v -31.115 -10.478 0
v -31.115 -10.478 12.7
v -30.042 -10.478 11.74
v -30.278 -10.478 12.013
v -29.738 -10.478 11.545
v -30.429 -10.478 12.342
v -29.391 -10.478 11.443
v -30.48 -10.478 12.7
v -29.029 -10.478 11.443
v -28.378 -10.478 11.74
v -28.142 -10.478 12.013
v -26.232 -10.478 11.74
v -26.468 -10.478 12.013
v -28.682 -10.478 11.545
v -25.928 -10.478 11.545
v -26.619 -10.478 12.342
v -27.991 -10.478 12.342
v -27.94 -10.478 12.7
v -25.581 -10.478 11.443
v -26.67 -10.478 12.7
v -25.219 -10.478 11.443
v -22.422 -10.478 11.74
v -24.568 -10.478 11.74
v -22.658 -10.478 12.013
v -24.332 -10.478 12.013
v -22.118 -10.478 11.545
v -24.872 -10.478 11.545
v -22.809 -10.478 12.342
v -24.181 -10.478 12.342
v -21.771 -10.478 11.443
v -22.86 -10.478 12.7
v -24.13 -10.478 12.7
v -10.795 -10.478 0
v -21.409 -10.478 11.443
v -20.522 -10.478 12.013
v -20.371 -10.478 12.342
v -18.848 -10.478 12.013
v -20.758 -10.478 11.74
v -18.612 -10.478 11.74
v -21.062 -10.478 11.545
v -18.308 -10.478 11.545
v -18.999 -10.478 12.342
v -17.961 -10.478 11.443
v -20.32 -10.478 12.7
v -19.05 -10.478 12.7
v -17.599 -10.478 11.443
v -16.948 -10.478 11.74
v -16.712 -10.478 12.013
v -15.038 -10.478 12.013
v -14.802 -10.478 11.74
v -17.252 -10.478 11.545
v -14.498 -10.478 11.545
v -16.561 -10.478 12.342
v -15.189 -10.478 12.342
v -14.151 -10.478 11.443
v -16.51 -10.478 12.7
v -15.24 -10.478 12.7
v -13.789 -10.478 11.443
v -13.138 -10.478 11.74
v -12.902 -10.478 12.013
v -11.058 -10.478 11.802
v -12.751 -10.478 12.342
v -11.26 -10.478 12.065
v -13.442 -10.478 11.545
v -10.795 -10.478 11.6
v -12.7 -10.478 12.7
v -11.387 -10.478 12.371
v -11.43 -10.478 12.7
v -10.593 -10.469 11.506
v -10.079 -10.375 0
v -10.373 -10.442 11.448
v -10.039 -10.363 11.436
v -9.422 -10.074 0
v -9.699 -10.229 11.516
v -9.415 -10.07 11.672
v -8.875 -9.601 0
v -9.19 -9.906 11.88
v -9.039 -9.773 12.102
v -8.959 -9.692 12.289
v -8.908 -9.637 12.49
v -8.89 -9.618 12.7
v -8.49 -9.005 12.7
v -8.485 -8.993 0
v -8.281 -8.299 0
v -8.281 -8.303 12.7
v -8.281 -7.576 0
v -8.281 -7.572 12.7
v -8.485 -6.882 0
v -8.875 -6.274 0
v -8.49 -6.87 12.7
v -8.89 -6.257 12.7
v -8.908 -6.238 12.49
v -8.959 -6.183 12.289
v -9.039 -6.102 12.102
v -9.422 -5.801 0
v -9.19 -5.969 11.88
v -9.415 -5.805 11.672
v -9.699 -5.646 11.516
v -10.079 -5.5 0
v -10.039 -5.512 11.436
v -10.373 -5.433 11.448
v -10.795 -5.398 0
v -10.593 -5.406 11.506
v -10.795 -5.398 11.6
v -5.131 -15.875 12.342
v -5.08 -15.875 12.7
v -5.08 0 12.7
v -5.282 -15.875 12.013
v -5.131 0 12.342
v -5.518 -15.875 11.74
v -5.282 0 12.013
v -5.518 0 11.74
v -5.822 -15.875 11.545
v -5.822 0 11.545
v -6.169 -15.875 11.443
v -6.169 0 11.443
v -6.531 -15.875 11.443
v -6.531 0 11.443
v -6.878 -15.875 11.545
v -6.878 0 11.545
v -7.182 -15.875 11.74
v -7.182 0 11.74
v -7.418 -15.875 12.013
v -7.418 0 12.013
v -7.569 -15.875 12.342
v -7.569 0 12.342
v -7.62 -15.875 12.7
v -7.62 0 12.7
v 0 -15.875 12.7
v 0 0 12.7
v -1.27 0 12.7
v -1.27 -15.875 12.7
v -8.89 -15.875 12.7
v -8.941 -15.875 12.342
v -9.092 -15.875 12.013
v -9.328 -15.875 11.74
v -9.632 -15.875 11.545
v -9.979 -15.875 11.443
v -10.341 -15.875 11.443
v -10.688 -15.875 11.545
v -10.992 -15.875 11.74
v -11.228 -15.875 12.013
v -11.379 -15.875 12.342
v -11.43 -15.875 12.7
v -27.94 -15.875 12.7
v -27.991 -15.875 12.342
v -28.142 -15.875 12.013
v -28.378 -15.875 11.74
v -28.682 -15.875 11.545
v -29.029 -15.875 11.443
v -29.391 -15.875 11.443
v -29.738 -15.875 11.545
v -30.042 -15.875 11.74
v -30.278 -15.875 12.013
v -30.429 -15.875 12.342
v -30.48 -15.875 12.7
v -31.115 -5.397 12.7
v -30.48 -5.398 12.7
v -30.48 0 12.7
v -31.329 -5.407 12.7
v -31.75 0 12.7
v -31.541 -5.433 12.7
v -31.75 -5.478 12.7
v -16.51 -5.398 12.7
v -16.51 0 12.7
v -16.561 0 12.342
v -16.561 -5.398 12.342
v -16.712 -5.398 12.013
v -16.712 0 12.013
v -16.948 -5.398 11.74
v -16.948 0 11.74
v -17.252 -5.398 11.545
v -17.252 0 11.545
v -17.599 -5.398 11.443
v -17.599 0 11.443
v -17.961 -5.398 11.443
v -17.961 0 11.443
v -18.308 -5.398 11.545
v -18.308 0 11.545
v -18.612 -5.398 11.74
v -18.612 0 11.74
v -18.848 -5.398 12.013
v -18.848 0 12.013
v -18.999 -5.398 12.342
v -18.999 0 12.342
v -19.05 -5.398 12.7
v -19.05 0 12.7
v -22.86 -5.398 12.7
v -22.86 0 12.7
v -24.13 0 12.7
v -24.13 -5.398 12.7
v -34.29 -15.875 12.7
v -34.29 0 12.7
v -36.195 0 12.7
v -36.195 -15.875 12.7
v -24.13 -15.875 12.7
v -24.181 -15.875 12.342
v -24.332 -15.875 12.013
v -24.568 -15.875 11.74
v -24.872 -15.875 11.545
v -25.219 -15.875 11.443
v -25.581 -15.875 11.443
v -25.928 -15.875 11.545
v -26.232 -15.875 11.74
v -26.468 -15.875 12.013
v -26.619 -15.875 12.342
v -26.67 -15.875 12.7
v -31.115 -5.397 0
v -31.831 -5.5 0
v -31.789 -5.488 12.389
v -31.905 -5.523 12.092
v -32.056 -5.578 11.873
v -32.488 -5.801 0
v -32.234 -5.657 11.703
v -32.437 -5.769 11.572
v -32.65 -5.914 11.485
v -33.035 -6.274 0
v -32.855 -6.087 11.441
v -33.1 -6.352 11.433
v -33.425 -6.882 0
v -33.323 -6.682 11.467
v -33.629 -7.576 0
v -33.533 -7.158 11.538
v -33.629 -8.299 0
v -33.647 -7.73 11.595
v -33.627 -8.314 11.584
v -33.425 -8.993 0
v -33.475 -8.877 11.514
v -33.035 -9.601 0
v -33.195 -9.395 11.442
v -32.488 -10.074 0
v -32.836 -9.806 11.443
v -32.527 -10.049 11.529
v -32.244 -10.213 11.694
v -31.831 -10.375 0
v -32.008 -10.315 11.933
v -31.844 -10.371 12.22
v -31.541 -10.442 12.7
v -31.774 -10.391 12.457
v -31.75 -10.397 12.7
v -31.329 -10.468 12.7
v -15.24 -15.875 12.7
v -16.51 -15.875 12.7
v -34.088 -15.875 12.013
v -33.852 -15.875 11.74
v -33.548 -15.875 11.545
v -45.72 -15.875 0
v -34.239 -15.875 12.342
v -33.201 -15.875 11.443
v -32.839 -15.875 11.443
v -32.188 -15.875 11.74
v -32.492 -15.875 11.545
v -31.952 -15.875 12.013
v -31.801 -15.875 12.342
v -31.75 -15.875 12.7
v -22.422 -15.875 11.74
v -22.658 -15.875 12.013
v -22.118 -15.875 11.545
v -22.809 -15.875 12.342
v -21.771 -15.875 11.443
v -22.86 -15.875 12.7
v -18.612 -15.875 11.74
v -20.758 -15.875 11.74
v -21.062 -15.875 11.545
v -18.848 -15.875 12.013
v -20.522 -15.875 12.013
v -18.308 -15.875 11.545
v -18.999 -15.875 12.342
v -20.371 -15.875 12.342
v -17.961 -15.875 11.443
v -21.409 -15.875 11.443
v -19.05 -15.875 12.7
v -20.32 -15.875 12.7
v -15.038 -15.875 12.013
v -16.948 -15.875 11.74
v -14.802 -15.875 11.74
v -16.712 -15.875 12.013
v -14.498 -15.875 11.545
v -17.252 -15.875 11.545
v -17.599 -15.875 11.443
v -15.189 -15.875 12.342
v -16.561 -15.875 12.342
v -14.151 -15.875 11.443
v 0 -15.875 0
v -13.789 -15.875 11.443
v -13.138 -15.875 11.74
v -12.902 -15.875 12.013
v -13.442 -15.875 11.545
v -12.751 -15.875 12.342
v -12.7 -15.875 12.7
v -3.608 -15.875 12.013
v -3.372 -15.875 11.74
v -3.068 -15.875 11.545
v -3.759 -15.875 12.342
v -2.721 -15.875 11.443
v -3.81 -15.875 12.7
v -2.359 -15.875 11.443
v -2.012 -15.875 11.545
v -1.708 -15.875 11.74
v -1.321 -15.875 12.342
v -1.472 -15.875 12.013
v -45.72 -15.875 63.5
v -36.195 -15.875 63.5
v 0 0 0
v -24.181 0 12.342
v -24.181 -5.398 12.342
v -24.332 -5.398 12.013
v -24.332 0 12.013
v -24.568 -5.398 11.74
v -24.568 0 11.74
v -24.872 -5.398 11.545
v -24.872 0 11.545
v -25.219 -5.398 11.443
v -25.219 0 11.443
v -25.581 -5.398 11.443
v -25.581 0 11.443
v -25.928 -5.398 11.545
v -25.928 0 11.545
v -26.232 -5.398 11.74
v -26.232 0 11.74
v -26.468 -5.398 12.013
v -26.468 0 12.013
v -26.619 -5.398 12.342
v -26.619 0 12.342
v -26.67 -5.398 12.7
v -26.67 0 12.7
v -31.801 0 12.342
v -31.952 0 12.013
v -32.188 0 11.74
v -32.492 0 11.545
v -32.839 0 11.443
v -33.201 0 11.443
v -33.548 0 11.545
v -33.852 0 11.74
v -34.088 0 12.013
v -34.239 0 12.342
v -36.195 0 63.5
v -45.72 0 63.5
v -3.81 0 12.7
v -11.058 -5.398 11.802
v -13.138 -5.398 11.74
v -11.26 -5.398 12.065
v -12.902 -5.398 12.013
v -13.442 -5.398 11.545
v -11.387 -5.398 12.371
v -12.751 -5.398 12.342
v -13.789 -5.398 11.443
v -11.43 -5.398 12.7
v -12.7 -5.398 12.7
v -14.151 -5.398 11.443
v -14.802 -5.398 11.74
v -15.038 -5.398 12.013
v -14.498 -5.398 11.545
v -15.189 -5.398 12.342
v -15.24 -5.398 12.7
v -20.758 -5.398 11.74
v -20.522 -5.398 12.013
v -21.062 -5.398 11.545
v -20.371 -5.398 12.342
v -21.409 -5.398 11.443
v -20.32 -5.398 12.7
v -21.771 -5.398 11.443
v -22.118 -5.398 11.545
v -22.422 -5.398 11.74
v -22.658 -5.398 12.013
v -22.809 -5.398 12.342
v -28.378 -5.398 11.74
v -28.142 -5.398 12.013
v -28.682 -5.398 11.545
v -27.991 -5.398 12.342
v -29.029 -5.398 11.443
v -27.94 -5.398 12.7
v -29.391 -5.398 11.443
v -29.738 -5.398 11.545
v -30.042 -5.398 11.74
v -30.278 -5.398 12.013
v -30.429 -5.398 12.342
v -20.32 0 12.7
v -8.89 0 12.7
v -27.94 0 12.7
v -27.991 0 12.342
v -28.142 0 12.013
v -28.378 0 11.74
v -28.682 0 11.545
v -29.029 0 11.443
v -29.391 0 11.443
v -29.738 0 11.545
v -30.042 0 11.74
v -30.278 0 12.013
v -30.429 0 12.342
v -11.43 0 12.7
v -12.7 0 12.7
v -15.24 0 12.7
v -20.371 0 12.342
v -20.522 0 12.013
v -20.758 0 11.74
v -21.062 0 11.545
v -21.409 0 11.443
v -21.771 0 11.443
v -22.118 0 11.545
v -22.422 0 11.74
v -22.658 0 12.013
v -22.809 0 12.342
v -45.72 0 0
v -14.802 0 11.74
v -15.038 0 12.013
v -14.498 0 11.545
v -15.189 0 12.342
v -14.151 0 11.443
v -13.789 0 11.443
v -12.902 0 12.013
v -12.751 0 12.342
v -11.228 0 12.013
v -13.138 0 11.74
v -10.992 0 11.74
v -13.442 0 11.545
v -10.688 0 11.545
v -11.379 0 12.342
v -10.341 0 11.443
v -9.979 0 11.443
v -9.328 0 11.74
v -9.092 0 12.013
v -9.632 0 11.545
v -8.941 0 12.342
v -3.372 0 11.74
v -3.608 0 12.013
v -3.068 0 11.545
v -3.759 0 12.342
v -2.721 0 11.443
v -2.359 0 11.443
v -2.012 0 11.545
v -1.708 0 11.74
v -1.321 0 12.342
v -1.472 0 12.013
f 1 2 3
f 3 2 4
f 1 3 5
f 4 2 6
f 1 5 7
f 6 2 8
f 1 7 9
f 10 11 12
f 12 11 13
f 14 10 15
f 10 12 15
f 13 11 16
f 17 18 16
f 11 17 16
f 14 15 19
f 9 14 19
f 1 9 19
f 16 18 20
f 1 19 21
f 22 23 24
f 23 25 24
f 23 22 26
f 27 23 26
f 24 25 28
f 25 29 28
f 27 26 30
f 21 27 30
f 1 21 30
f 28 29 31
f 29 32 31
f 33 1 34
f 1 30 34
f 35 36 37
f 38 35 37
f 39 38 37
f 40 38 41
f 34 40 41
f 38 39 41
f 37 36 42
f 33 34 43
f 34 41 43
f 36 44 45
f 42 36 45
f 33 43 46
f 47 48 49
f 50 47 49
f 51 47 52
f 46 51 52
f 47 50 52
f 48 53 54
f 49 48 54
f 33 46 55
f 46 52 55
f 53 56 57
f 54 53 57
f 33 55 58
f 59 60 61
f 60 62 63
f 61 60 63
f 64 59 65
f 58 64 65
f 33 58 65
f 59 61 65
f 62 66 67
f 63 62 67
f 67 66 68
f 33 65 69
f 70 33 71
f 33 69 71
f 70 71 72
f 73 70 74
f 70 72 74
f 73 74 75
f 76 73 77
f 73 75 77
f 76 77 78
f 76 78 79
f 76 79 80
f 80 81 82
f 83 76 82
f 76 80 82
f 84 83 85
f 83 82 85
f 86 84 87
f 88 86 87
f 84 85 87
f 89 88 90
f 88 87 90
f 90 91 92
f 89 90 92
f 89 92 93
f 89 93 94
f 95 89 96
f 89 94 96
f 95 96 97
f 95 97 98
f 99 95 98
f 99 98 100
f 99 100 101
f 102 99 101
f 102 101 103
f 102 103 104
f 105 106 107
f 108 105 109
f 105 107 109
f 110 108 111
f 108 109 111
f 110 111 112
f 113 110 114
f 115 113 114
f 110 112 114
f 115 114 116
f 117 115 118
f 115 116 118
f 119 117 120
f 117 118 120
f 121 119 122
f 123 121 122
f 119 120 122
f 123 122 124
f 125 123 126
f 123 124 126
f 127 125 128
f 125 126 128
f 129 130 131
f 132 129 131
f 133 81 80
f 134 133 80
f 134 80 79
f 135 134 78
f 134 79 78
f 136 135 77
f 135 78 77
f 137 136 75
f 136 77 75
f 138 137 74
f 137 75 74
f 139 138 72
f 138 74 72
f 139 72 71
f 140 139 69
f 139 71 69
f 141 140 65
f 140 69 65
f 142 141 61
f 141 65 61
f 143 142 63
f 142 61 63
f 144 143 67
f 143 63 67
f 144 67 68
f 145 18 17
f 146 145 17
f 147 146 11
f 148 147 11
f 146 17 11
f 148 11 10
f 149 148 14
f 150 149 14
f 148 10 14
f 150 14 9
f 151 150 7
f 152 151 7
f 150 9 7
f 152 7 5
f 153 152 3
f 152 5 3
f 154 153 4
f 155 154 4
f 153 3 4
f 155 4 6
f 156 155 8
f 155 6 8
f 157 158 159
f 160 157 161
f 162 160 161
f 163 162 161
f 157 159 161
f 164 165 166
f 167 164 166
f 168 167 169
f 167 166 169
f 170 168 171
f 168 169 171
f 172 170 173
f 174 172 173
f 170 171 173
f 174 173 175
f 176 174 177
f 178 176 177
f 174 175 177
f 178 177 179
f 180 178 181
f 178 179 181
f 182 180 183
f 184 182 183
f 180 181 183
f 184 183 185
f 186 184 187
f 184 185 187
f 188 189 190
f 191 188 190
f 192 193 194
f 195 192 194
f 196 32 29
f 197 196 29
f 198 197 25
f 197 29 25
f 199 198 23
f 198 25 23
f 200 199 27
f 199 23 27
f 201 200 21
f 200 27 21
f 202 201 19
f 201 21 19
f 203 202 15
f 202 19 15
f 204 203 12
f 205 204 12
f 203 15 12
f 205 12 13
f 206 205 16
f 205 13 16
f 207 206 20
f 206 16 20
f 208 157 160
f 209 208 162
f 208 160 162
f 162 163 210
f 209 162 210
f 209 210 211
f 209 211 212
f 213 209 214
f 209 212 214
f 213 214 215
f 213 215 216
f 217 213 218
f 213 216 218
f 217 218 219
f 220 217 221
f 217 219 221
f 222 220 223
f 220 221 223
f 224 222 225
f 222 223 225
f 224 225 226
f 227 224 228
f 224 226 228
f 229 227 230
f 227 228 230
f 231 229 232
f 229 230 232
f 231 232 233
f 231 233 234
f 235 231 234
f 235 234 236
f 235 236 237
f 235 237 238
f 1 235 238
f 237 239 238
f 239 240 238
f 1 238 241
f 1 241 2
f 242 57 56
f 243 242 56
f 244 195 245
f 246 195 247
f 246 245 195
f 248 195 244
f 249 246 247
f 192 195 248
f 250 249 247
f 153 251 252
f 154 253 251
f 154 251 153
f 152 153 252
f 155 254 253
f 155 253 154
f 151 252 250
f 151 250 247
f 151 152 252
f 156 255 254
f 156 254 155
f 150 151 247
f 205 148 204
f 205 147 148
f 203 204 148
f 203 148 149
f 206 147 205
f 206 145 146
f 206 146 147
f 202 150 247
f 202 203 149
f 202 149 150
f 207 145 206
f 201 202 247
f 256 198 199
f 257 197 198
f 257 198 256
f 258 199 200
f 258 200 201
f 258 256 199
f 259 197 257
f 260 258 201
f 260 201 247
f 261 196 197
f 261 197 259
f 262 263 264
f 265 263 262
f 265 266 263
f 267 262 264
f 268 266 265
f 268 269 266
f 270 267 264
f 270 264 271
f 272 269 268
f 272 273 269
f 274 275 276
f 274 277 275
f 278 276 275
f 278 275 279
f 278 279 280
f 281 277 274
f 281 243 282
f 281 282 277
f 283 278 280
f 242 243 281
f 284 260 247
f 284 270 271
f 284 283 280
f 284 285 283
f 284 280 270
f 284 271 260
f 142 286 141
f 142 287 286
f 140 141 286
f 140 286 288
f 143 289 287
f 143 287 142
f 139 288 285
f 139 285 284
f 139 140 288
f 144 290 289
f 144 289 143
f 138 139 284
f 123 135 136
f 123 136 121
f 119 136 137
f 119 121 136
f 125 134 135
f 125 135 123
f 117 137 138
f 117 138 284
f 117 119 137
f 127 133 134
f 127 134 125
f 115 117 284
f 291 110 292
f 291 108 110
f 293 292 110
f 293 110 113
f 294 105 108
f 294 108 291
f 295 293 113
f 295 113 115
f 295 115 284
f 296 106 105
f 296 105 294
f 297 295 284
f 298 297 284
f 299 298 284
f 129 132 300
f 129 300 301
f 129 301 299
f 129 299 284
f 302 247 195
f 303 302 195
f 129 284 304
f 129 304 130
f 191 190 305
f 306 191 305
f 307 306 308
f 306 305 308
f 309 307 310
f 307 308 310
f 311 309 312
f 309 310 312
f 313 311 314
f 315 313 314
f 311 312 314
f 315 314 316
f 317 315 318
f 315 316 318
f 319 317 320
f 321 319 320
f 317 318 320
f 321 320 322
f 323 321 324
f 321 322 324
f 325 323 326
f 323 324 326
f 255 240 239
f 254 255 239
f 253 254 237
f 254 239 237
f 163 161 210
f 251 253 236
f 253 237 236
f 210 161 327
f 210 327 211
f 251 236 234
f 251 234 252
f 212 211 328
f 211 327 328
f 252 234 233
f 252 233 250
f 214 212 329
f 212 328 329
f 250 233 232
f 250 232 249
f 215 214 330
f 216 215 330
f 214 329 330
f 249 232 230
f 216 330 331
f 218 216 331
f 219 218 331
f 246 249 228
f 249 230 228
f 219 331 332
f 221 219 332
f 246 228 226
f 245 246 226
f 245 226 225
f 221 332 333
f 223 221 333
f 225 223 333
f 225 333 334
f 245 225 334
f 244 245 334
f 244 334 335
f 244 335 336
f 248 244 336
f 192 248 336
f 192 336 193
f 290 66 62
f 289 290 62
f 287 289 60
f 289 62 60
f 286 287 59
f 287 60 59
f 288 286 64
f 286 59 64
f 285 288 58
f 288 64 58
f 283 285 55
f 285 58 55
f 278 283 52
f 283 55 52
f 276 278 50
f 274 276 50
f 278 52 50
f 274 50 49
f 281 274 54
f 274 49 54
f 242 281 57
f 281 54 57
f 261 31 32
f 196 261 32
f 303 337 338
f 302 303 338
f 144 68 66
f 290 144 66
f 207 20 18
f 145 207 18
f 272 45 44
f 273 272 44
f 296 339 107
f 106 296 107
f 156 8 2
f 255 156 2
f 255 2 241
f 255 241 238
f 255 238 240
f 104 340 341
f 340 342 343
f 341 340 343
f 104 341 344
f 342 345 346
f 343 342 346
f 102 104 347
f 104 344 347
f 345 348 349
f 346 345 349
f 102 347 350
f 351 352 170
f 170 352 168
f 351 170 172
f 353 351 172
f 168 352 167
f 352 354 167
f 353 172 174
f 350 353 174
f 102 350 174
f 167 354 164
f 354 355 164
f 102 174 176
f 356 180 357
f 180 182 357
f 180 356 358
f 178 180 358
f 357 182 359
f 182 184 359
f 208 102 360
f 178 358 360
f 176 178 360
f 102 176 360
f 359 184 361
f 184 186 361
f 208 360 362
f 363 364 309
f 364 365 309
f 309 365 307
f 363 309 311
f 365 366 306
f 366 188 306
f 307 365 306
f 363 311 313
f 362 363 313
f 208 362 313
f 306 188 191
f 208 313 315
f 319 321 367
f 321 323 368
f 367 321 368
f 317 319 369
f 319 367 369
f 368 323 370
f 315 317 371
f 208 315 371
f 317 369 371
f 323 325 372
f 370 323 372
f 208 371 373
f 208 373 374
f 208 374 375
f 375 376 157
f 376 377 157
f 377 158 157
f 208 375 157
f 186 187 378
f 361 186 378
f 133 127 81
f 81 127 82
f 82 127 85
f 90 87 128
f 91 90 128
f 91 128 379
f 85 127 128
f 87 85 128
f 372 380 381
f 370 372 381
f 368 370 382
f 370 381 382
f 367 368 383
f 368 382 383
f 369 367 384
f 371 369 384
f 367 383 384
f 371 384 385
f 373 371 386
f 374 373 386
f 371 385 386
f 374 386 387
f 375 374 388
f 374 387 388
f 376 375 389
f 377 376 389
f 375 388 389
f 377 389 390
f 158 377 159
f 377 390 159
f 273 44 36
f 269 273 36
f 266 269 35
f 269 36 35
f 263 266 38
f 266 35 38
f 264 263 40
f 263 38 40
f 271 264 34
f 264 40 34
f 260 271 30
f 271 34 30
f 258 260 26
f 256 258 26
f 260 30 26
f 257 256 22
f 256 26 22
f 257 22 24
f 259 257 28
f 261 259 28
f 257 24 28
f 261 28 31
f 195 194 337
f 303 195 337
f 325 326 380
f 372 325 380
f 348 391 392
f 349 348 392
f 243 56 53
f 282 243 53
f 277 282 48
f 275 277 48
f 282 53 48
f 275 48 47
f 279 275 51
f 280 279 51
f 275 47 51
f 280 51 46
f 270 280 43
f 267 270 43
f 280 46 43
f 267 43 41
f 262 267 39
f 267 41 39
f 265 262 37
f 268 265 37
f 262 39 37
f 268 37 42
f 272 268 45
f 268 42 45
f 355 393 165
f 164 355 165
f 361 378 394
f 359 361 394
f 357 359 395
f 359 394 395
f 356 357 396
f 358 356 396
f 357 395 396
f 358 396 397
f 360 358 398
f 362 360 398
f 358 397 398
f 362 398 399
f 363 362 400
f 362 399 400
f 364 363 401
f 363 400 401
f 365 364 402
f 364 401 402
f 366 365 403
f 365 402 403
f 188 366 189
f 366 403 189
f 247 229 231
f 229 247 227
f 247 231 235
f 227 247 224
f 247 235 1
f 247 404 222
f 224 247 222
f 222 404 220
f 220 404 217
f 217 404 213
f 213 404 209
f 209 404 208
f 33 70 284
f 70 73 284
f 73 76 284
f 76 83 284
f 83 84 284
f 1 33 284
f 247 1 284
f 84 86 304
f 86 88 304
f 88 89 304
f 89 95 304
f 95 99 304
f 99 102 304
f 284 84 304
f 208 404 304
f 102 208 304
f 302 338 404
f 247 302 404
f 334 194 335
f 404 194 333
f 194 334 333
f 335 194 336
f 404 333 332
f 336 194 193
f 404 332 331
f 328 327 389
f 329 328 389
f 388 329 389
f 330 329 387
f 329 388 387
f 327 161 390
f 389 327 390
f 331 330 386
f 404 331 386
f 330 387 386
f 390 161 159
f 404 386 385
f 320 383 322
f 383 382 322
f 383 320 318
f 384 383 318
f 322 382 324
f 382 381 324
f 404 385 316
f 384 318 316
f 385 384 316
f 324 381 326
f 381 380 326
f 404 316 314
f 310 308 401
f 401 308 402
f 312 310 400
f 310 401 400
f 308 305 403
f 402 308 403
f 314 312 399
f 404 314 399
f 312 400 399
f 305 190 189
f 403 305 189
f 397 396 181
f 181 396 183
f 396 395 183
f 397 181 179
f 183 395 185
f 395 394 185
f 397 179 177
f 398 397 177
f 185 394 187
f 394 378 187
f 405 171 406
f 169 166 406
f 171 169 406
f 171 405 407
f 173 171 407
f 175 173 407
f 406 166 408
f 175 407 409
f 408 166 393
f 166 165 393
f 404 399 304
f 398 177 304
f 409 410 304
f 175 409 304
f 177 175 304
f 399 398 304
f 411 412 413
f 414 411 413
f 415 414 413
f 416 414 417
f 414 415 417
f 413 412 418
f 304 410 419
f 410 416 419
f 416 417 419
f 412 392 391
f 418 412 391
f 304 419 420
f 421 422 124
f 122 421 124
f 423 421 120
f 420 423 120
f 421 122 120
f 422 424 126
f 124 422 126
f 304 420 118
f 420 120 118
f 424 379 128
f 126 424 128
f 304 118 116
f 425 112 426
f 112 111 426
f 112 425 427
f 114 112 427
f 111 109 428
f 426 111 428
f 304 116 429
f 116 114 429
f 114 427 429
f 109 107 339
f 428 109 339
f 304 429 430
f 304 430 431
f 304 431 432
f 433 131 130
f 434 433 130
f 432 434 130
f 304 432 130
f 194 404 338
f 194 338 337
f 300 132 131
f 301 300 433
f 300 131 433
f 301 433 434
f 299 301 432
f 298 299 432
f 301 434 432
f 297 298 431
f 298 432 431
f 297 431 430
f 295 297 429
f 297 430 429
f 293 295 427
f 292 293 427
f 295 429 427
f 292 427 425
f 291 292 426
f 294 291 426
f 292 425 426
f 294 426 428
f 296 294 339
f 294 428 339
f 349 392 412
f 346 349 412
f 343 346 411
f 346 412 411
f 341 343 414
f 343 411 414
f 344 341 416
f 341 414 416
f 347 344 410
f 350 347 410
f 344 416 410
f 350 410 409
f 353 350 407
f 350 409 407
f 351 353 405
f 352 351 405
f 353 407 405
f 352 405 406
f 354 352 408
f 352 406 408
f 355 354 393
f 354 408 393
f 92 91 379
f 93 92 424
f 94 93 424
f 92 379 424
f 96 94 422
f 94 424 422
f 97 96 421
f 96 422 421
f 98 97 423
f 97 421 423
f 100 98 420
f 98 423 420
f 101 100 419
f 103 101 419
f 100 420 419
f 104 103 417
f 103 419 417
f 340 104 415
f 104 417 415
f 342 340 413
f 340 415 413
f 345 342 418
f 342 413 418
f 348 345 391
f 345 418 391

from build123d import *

# Parameters (mm, degrees)
F1_DEPTH = 15.875
F3_DEPTH = 25.4
F5_DEPTH = 25.4


with BuildPart() as f1:
    # F0 (on Front) → F1 (new body)
    with BuildSketch(Plane.XZ):
        Polygon((-45.72, 0), (0, 0), (0, 12.7), (-36.195, 12.7), (-36.195, 63.5), (-45.72, 63.5), align=None)
    extrude(amount=F1_DEPTH)

    # F2 (on face) → F3 (cut)
    with BuildSketch(Plane.XY.offset(12.7)):
        with BuildLine():
            Line((-10.795, -5.3975), (-31.115, -5.3975))
            ThreePointArc((-31.115, -5.3975), (-33.655, -7.9375), (-31.115, -10.4775))
            Line((-31.115, -10.4775), (-10.795, -10.4775))
            ThreePointArc((-10.795, -10.4775), (-8.255, -7.9375), (-10.795, -5.3975))
        make_face()
    extrude(amount=-F3_DEPTH, mode=Mode.SUBTRACT)

    # F4 (on face) → F5 (cut)
    with BuildSketch(Plane(origin=(0, 0, 0), x_dir=(-1, 0, 0), z_dir=(0, 1, 0))):
        with BuildLine():
            ThreePointArc((24.13, 12.7), (25.4, 11.43), (26.67, 12.7))
            Line((26.67, 12.7), (24.13, 12.7))
        make_face()
        with BuildLine():
            Line((30.48, 12.7), (27.94, 12.7))
            ThreePointArc((27.94, 12.7), (29.21, 11.43), (30.48, 12.7))
        make_face()
        with BuildLine():
            ThreePointArc((20.32, 12.7), (21.59, 11.43), (22.86, 12.7))
            Line((22.86, 12.7), (20.32, 12.7))
        make_face()
        with BuildLine():
            Line((34.29, 12.7), (31.75, 12.7))
            ThreePointArc((31.75, 12.7), (33.02, 11.43), (34.29, 12.7))
        make_face()
        with BuildLine():
            ThreePointArc((16.51, 12.7), (17.78, 11.43), (19.05, 12.7))
            Line((19.05, 12.7), (16.51, 12.7))
        make_face()
        with BuildLine():
            ThreePointArc((12.7, 12.7), (13.97, 11.43), (15.24, 12.7))
            Line((15.24, 12.7), (12.7, 12.7))
        make_face()
        with BuildLine():
            ThreePointArc((8.89, 12.7), (10.16, 11.43), (11.43, 12.7))
            Line((11.43, 12.7), (8.89, 12.7))
        make_face()
        with BuildLine():
            ThreePointArc((5.08, 12.7), (6.35, 11.43), (7.62, 12.7))
            Line((7.62, 12.7), (5.08, 12.7))
        make_face()
        with BuildLine():
            Line((3.81, 12.7), (1.27, 12.7))
            ThreePointArc((1.27, 12.7), (2.54, 11.43), (3.81, 12.7))
        make_face()
        with BuildLine():
            ThreePointArc((3.81, 12.7), (2.54, 13.97), (1.27, 12.7))
            Line((1.27, 12.7), (3.81, 12.7))
        make_face()
    extrude(amount=-F5_DEPTH, mode=Mode.SUBTRACT)


solid = f1.part
